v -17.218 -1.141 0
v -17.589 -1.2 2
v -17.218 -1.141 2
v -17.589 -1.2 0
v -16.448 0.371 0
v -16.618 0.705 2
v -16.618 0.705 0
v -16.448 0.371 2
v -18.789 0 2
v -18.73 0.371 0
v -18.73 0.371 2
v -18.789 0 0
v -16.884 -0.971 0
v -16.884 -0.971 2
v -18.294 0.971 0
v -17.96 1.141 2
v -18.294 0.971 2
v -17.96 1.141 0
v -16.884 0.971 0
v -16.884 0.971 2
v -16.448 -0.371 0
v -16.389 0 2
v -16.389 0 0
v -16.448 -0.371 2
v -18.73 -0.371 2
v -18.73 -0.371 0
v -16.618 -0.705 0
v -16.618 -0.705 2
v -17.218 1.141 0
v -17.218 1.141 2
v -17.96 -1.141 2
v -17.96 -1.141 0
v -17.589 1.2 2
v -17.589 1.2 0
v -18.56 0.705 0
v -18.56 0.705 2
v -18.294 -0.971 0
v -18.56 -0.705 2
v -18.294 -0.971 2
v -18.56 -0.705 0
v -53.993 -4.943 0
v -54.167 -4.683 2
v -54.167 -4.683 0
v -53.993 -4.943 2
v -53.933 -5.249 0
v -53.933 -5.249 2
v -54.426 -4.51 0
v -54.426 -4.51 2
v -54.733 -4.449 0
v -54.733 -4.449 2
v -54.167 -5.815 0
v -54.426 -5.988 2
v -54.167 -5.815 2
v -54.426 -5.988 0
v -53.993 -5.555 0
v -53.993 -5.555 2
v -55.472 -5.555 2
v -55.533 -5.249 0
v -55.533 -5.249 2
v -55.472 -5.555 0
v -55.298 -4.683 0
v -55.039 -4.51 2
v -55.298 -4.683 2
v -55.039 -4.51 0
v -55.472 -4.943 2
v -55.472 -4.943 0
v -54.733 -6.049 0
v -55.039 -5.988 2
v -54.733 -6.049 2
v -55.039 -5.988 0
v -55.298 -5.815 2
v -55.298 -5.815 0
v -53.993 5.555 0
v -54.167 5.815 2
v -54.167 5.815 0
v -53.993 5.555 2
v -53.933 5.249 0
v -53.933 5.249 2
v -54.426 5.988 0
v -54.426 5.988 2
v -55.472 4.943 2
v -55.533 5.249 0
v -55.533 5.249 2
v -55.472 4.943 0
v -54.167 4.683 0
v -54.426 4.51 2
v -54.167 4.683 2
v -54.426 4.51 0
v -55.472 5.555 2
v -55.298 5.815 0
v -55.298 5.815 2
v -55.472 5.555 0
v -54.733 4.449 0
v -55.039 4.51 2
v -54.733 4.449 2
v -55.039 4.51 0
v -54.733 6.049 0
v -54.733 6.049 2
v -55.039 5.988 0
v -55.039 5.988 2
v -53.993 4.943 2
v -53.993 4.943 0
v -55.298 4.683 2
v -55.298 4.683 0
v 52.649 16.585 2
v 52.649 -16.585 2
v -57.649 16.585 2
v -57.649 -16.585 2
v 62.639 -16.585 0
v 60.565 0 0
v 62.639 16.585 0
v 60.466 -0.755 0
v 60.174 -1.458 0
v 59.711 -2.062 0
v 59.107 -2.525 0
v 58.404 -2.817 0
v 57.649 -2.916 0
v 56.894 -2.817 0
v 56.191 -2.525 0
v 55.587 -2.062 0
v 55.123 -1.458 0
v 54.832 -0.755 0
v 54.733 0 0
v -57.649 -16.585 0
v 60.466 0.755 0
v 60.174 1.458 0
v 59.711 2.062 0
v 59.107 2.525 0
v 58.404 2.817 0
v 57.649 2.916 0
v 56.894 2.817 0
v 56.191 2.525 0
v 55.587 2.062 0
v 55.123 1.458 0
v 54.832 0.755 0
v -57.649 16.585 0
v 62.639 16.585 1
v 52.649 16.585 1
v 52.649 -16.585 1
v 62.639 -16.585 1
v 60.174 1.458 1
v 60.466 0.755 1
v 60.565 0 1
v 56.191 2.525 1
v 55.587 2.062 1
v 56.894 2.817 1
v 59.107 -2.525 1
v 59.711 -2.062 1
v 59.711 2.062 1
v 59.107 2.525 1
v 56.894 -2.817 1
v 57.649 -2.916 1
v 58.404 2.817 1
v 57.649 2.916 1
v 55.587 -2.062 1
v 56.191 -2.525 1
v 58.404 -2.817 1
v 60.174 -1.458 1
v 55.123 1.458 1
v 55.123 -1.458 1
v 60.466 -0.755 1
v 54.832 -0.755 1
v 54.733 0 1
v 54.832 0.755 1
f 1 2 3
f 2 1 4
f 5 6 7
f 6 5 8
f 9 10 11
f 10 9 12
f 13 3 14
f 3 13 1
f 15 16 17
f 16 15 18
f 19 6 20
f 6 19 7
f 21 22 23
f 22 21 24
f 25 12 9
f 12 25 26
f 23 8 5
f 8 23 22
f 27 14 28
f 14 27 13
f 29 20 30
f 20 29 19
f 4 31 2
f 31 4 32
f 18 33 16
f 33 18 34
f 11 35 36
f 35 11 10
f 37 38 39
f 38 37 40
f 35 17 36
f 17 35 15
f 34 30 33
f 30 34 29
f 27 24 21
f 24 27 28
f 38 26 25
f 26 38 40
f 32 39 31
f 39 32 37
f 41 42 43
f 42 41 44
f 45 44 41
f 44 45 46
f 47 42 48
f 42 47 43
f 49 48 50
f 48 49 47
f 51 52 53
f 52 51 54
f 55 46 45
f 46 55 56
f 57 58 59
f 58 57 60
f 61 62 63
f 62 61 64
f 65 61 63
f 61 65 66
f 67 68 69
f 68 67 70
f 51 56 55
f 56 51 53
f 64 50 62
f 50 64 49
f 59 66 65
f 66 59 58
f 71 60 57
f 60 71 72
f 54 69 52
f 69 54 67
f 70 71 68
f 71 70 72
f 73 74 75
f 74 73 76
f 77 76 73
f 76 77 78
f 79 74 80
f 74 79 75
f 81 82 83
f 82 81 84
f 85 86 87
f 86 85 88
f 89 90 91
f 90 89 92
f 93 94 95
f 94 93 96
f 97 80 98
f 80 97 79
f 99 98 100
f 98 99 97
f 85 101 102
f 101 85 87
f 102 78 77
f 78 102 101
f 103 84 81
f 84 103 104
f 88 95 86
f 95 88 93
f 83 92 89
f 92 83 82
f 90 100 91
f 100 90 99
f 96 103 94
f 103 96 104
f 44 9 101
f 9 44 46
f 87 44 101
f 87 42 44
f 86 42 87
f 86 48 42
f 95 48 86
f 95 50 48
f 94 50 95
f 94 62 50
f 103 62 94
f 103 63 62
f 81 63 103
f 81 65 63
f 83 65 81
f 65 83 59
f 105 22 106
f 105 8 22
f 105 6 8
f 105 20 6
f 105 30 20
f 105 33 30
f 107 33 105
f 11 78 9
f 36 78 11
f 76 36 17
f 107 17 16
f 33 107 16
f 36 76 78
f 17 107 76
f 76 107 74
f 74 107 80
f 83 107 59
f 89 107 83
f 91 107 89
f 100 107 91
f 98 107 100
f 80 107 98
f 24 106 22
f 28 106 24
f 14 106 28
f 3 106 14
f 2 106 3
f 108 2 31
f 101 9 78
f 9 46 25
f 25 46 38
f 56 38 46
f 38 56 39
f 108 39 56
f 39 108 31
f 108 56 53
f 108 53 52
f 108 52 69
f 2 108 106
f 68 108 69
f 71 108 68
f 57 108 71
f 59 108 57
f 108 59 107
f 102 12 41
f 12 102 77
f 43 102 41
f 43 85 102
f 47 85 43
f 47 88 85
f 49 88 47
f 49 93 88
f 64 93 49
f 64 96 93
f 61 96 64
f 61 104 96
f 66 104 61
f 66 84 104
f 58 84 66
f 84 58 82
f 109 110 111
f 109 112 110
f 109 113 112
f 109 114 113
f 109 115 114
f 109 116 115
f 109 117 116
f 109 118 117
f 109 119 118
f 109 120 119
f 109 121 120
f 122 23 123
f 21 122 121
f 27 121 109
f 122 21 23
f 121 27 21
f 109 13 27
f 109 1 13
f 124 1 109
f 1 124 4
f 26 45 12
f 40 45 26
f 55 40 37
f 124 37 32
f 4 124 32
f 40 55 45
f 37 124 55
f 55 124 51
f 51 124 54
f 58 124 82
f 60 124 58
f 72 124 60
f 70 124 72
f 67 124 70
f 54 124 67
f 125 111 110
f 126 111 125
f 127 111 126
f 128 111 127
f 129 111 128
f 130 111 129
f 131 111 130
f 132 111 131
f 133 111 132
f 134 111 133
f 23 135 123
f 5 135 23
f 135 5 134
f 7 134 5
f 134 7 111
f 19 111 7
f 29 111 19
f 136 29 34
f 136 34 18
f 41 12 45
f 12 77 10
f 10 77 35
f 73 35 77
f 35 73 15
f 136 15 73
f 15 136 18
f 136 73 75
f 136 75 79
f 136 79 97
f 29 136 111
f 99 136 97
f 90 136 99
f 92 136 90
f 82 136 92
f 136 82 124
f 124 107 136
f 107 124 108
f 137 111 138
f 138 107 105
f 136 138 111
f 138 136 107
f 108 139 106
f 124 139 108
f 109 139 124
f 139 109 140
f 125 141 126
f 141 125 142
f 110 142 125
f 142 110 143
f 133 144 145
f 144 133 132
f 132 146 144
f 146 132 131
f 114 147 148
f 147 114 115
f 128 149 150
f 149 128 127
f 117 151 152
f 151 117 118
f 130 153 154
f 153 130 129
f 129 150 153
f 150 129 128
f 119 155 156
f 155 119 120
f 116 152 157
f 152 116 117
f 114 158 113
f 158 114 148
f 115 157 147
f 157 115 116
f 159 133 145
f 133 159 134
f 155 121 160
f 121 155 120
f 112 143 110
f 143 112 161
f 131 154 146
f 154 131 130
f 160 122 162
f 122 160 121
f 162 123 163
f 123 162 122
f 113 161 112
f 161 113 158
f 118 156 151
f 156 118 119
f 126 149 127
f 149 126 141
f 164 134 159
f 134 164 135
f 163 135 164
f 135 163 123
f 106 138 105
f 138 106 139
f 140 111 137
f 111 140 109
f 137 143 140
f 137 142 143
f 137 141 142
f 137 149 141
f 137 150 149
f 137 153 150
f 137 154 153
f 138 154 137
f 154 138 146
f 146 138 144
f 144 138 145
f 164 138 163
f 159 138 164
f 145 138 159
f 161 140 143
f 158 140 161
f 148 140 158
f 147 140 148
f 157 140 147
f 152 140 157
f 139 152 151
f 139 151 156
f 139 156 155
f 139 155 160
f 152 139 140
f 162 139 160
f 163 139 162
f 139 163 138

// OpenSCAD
// file: ../../library/e7_all.scad
// ==========================================================================
//  e7_all.scad - include this one file. Preview, print plates and the report.
// ==========================================================================
include <e7_params.scad>
include <e7_body.scad>

// whole painted loco
module e7_preview() {
  // carbody in its paint bands
  for (i = [0:len(PAINT_BANDS) - 1]) {
    z0 = i == 0 ? -1 : p(PAINT_BANDS[i - 1][0]);
    z1 = i == len(PAINT_BANDS) - 1 ? 1000 : p(PAINT_BANDS[i][0]);
    color(PAINT_BANDS[i][1]) render(convexity = 8) e7_shell_solid([z0, z1]);
  }
  color(C_GLASS) e7_glass();
  color(C_LENS) let (d = nose_d_at_z(HEADLIGHT[0]))
    translate([XF - p(d) + p(HEADLIGHT[2]) + p(1.5), 0, p(HEADLIGHT[0])]) rotate([0, 90, 0]) cylinder(d = p(HEADLIGHT[1]) - 0.8, h = 0.5, $fn = 32);
  color(C_FRAME) { for (j = [1:NFRAME]) e7_frame_piece(j); e7_pilot(); e7_pilot_rear(); }
  for (tx = [TRK_X, -TRK_X]) translate([tx, 0, 0]) { color(C_TRUCK) e7_truck_frame(); color(C_WHEEL) e7_wheels(); }
}
// thin glass panes sitting in the window pockets (preview only)
module e7_glass() {
  intersection() { e7_loft(DET * 0.6); union() { e7_windshield_cut(); e7_side_cuts_windows_only(); } }
}
module e7_side_cuts_windows_only() {
  for (s = [-1, 1], w = CAB_WIN)
    translate([XF - p(w[1]), s * HW - (s > 0 ? DET : 3 - DET), p(w[2])]) cube([p(w[1] - w[0]), 3, p(w[3] - w[2])]);
}

// one print, laid out for the printer
module e7_plate(part) {
  sec = [for (k = [1:NSEC]) str("body_", k)];
  frm = [for (j = [1:NFRAME]) str("frame_", j)];
  if (is_num(search([part], sec)[0])) {
    k = search([part], sec)[0] + 1;
    // stand the section on its open bottom (skirt edge on the bed)
    translate([-sec_x0(k) - SEC_L / 2, 0, -Z_SKIRT]) e7_body_section(k);
  } else if (is_num(search([part], frm)[0])) {
    j = search([part], frm)[0] + 1;
    xs = concat([FRAME_X0], FRAME_SPLITS, [FRAME_X1]);
    translate([-(xs[j - 1] + xs[j]) / 2, 0, -Z_FRAME_BOT]) e7_frame_piece(j);
  } else if (part == "pilot") {
    translate([-XF, 0, 0]) rotate([0, 0, 0]) translate([0, 0, -p(5)]) e7_pilot();
  } else if (part == "pilot_rear") {
    translate([-XR, 0, 0]) translate([0, 0, -(CPL_Z - CPL_H / 2 - WALL)]) e7_pilot_rear();
  } else if (part == "truck") {
    // upside down, bolster on the bed
    translate([0, 0, Z_FRAME_BOT - 0.3]) rotate([180, 0, 0]) e7_truck_frame();
  } else {
    assert(false, str("unknown part '", part, "'"));
  }
}

module e7_report() {
  echo(str("MILW E7A ", ROAD_NO, " class ", CLASS, " - ", SC, " scale 1:", RATIO, ", paint ", PAINT));
  echo(str("  carbody ", round(BL), " mm long, ", round(2 * HW), " mm wide, roof ", round(Z_ROOF), " mm, cab ", round(Z_CAB), " mm above rail"));
  echo(str("  ", NSEC, " body sections of ", round(SEC_L), " mm; ", NFRAME, " frame pieces; trucks at +/- ", round(TRK_X), " mm"));
  echo(str("  body screws ", SCREW_BODY_NAME, " x ", 2 * len(BOSS_X), "; truck pivots ", PIVOT[1], "; wheels ", round(WHEEL_D * 10) / 10, " mm (bought)"));
}
// main file
// Milwaukee Road E7A, HO scale 1-87 - print 2 of 6: frame_1 - frame plate piece 1 (rear; print flat)
// Render (F6), export STL, print. Settings: ../../library/e7_params.scad
// Whole loco preview and notes: ../../MILW_E7_Main.scad
SCALE_SEL = "HO";
include <../../library/e7_all.scad>
e7_plate("frame_1");
